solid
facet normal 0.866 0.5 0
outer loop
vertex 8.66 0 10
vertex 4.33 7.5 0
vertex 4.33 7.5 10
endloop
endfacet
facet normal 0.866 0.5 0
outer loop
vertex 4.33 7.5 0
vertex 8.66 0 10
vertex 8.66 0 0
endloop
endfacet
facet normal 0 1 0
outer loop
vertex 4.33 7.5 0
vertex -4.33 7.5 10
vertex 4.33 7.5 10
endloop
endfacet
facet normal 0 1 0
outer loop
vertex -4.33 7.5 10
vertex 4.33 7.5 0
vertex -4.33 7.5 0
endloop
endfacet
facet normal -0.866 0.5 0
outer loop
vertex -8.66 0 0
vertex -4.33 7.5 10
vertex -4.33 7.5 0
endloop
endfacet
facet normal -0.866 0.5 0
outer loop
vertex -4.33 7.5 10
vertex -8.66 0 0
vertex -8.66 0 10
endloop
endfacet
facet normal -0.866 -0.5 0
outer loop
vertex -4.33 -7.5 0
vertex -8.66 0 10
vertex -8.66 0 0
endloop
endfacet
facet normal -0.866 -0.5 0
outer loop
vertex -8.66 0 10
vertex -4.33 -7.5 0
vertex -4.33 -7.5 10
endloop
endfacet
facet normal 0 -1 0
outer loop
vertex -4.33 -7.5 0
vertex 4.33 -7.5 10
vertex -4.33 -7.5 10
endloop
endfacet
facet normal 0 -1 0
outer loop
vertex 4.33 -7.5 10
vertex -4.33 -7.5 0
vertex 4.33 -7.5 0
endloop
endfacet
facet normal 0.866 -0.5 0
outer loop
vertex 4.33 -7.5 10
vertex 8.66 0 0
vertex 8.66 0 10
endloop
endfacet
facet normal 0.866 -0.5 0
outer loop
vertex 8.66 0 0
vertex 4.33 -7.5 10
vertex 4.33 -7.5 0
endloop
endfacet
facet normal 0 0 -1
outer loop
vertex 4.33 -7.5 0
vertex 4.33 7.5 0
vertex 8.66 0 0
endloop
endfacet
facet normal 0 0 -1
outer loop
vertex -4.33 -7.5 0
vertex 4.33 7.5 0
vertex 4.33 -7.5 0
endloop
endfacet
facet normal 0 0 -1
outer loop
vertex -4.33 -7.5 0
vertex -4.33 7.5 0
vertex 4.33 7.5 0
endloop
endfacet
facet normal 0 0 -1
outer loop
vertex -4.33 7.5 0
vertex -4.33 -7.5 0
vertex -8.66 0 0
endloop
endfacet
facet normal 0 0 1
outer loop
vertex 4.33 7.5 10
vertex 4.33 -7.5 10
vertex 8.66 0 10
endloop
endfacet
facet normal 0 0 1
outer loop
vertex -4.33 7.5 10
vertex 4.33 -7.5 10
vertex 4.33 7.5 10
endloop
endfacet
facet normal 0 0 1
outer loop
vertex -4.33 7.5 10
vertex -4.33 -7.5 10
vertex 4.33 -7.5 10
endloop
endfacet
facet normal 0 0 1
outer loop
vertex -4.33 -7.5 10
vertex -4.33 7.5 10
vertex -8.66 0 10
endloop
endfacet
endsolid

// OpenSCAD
module hexagonal_prism(length = 10) {
    h = sqrt(3)*length;
    cylinder(h=length, r = h*0.5, $fn=6);
}

hexagonal_prism();
